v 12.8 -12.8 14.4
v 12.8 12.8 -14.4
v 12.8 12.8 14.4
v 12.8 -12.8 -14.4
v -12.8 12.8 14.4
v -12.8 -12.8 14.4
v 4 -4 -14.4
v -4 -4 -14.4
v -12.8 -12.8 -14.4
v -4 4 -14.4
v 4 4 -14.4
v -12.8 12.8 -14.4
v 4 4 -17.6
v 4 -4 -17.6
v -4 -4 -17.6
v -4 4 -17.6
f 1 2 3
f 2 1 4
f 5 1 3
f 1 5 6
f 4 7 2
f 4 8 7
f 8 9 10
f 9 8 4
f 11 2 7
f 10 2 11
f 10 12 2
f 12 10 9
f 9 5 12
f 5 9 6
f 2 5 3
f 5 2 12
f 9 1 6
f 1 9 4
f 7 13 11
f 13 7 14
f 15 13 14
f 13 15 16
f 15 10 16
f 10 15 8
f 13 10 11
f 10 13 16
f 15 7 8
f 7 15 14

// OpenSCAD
size = 32;//block=32 //item=8


difference() {
  cube([size * 0.8, size * 0.8, size * 0.9], center = true);

  %union() {
    translate([0, 0, -size * 0.0]) {
      cube([size * 0.75, size * 0.75, size * 0.8], center = true);//hollow
    }
    ;//translate
  }
  ;//union
}
;//difference
translate([0, 0, -size * 0.5]) {
  cube([size * 0.25, size * 0.25, size * 0.1], center = true);
}
;//translate
